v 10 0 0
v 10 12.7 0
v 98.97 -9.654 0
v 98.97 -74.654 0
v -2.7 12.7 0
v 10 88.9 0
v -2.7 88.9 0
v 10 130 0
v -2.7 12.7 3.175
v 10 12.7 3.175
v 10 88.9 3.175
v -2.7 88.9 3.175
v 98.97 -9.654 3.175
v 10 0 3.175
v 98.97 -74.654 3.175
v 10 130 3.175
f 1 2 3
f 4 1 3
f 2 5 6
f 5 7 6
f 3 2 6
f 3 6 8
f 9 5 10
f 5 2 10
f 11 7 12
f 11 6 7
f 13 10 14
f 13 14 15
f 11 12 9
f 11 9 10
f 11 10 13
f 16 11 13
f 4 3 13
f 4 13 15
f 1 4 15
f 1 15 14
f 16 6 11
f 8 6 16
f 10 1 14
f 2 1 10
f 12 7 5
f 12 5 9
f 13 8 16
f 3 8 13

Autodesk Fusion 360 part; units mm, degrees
sketch "Sketch1" plane through (0, 0, 0) normal (0, 0, 1) x (1, 0, 0)
  line L0 (0, 6.35) -> (0, 0)
  line L1 (0, 0) -> (76.2, 0)
  line L2 (76.2, 0) -> (76.2, 31.75)
  line L3 (76.2, 31.75) -> (0, 88.9)
  line L4 (0, 88.9) -> (0, 82.55)
  line L5 (0, 82.55) -> (-20.828, 82.55)
  line L6 (-20.828, 82.55) -> (-20.828, 6.35)
  line L7 (-20.828, 6.35) -> (0, 6.35)
  line L8 (10, 0) -> (10, 130)
  line L9 (-221.1749, 94.6346) -> (-221.1749, -30.5637)
  line L10 (10, 130) -> (98.9697, -9.6544)
  line L11 (98.9697, -9.6544) -> (98.9697, -74.6544)
  line L12 (98.9697, -74.6544) -> (10, 0)
  dimension "d1" = 10
  dimension "d12" = 130
  dimension "d15" = 32.5
  dimension "d18" = 130
  dimension "d22" = 65
extrude "Extrude1" add sketch "Sketch1" along normal blind 3.175 contours L1 L2 L3 L8 L10 | L1 L2 L10 L11 L12 | L3 L8 L10 makes body 1
copy_body "Body->Comp1" bodies 1 removing the originals makes body 2 in component "Component"
sketch "Sketch3" plane through (10, 0, 0) normal (-1, 0, 0) x (0, 0, 1)
  line L0 (0, 130) -> (0, 0)
  line L1 (0, 0) -> (3.175, 0)
  line L2 (3.175, 0) -> (3.175, 130)
  line L3 (0, 12.7) -> (3.175, 12.7)
  line L4 (0, 88.9) -> (3.175, 88.9)
  line L5 (3.175, 130) -> (0, 130)
  dimension "d20" = 12.7
  dimension "d21" = 76.2
extrude "Extrude1'" add sketch "Sketch3" along normal blind 12.7 contours L0 L2 L3 L4 bodies 2 in component "Component"
component "Component" placed x (1, 0, 0) y (0, 1, 0) z (0, 0, 1) at (0, 0, 0)
equation "d2 = ( 1 / 8 ) * 1 in"
